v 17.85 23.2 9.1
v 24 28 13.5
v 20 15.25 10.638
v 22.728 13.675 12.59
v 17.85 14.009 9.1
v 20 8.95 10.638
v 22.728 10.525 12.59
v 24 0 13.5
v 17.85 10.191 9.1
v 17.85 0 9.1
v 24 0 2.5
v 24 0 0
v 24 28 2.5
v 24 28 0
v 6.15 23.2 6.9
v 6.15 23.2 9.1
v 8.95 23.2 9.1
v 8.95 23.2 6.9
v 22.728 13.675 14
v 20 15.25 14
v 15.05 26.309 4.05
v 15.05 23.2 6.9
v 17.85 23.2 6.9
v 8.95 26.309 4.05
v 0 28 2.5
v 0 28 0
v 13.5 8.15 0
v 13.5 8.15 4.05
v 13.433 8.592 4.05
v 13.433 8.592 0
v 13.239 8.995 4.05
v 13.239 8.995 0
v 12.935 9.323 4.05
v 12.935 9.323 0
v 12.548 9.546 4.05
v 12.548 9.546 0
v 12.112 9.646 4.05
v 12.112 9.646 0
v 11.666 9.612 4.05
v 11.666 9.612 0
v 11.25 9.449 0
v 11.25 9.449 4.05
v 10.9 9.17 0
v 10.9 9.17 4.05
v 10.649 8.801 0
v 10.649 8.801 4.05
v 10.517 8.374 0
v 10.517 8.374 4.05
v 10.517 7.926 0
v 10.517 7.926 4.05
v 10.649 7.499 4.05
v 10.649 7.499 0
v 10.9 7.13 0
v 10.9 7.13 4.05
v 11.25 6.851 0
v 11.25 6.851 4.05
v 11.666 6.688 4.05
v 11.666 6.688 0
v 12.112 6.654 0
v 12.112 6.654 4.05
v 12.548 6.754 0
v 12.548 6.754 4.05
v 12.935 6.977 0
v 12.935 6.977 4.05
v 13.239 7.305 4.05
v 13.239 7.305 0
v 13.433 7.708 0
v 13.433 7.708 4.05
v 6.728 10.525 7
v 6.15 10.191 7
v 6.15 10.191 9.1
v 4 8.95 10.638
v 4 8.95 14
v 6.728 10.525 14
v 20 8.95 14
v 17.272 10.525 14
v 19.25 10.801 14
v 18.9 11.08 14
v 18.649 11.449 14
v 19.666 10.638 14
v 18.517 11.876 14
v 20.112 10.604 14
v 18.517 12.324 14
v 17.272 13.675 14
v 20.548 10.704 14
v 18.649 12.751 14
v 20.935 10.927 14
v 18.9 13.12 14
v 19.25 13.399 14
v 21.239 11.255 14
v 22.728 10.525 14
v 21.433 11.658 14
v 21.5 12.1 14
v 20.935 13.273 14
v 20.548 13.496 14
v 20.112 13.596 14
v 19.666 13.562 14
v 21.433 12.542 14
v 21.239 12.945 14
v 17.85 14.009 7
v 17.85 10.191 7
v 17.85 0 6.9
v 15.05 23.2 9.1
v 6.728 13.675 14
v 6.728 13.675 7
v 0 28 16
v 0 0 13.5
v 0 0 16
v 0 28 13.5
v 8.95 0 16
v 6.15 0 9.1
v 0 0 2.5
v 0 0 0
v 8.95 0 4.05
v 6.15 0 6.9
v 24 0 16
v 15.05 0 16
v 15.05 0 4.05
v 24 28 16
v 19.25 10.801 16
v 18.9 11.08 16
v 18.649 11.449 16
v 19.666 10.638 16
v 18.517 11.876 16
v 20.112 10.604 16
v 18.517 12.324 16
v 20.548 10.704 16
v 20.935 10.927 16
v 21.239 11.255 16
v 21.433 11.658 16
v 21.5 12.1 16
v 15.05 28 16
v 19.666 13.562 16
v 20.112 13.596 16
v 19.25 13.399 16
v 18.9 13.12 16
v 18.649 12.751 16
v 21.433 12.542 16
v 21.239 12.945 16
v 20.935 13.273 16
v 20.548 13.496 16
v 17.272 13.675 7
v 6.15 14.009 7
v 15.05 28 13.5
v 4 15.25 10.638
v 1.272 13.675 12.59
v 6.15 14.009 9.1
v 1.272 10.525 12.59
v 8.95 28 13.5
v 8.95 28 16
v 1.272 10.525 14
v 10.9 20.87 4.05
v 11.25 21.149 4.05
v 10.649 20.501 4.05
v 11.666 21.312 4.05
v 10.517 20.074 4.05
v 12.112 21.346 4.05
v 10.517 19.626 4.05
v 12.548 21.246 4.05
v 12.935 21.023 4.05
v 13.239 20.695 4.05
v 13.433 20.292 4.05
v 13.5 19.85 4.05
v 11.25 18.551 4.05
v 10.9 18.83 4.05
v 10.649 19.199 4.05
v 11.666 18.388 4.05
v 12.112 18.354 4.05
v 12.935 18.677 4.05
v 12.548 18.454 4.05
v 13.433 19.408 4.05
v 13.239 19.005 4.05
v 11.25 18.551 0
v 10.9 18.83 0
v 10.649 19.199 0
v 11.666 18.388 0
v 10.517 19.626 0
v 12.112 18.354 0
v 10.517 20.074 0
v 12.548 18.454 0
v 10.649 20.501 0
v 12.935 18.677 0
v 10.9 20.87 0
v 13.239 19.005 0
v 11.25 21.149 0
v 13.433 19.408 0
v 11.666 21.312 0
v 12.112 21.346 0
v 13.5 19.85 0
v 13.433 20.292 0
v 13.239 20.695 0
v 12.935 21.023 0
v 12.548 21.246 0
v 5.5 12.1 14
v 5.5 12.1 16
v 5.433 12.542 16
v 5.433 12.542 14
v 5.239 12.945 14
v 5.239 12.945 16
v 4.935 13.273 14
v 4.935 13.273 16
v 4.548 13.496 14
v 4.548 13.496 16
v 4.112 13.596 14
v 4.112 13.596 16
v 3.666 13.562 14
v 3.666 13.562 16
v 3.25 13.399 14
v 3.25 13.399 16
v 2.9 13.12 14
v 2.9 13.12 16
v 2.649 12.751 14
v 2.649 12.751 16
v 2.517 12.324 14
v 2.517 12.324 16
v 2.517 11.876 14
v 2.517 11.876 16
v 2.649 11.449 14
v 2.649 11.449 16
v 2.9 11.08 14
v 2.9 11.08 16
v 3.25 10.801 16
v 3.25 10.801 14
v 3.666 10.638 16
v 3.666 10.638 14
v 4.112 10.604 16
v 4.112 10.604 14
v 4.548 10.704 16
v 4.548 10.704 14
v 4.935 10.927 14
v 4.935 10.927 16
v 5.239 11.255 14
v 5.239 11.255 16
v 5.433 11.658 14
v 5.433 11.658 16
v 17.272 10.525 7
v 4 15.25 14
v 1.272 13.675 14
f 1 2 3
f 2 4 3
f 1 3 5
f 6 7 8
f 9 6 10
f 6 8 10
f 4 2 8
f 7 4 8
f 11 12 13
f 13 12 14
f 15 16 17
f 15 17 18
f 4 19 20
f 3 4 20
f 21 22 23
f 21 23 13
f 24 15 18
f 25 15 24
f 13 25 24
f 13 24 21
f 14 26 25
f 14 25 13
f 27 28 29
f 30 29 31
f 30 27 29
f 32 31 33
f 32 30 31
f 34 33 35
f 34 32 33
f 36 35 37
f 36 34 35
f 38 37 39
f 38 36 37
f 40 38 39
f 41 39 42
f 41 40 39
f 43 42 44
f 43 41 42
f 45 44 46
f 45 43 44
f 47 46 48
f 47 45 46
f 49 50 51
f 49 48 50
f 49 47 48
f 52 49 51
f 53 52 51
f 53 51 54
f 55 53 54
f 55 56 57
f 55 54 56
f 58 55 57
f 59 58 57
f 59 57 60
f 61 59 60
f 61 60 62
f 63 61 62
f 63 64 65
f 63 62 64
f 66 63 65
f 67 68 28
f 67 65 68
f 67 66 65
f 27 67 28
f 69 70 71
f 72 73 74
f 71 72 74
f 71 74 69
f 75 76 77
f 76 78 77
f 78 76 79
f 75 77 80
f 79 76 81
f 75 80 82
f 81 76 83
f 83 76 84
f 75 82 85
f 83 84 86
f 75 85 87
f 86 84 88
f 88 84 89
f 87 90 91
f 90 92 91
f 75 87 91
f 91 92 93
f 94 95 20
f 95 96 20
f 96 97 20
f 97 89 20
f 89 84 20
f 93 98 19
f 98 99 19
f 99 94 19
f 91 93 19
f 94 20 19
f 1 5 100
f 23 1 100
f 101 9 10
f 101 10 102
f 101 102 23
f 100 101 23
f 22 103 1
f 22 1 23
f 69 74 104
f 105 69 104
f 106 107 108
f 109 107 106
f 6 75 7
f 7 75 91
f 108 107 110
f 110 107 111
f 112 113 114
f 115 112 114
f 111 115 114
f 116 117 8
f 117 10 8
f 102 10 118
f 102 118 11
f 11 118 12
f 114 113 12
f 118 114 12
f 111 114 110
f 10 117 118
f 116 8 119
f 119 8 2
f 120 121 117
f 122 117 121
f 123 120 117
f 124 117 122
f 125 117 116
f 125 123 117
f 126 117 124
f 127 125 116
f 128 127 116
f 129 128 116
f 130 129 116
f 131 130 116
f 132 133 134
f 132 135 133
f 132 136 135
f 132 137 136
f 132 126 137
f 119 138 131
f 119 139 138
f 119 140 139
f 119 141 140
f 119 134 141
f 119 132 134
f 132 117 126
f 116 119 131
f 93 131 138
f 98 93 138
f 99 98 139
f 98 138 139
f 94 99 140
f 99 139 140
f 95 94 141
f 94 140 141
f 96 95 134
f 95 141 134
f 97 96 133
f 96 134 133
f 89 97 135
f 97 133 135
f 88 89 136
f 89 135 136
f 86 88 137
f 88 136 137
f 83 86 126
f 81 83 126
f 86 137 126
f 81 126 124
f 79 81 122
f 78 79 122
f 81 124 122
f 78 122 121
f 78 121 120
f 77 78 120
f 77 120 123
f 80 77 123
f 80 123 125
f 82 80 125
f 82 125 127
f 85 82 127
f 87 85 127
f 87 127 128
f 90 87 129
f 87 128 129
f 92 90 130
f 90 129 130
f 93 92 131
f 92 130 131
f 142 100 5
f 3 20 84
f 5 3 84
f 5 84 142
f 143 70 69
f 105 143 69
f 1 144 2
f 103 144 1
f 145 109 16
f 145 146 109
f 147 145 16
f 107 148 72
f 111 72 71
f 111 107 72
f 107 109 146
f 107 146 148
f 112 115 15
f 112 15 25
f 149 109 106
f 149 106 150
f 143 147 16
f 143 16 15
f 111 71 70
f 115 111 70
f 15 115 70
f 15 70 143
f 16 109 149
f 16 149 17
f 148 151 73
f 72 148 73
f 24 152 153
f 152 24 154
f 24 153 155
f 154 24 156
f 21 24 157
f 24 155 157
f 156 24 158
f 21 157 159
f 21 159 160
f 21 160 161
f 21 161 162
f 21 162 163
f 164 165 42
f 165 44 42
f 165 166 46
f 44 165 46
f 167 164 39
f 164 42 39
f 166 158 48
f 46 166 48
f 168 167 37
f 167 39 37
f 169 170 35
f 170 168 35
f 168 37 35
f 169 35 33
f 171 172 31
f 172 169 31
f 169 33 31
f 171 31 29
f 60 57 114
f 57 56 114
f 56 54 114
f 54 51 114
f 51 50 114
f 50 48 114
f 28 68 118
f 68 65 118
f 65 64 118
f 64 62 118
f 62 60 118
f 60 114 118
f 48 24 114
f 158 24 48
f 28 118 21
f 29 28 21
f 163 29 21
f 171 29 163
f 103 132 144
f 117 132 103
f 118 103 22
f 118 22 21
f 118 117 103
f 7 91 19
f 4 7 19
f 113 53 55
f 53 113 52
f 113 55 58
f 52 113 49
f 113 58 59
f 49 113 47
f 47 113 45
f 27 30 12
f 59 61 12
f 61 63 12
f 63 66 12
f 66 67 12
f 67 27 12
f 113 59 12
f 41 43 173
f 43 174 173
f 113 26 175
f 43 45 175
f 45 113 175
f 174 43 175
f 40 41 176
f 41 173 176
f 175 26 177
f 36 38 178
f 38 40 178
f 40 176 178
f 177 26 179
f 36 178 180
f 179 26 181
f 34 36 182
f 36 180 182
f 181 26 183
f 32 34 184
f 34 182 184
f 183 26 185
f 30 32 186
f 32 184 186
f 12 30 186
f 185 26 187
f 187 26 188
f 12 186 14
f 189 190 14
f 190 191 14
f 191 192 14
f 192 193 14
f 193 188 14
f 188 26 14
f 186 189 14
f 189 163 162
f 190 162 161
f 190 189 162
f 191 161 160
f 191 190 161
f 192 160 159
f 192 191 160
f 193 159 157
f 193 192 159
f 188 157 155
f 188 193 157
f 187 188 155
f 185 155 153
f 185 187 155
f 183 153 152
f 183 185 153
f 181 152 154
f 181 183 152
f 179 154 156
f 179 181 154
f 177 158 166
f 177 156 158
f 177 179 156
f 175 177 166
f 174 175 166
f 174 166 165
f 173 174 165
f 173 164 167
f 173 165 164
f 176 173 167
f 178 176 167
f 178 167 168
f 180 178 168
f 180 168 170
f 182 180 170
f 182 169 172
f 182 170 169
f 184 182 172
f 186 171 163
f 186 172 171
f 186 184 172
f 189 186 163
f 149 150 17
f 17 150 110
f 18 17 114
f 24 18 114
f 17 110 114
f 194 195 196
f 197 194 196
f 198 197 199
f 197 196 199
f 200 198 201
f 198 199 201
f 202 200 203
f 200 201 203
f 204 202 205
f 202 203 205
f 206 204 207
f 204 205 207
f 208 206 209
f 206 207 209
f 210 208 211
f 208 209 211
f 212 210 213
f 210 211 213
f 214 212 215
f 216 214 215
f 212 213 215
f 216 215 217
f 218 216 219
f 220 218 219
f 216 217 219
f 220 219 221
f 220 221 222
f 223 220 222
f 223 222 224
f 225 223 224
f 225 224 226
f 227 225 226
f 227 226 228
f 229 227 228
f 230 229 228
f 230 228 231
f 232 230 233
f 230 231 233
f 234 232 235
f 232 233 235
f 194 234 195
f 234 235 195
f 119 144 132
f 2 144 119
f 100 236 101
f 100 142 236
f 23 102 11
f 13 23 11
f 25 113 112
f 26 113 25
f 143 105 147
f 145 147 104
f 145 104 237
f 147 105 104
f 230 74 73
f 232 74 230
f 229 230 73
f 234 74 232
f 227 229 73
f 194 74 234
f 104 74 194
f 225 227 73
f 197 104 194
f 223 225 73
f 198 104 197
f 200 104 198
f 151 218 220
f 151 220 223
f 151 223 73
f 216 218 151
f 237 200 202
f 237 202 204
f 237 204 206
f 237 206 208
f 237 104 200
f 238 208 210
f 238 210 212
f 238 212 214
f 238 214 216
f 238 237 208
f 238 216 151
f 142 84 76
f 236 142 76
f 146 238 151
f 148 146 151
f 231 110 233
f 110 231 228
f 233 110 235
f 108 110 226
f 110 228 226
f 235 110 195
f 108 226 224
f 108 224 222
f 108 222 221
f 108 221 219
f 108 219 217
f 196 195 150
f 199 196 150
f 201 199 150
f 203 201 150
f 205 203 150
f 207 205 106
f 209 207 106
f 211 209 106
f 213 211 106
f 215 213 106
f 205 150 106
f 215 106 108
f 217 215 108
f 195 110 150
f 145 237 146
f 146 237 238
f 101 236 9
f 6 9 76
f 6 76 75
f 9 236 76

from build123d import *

# Parameters (mm, degrees)
ESBO_O1_W                = 24
ESBO_O1_H                = 28
ESBO_O1_R                = 1.5
RESSALTO_EXTRUS_O1_DEPTH = 16
ESBO_O2_W                = 6.1
ESBO_O2_H                = 11.95
CORTE_EXTRUS_O1_DEPTH    = 41.199502484
CORTE_EXTRUS_O3_DEPTH    = 41.199502484
ESBO_O4_R                = 1.5
CORTE_EXTRUS_O4_DEPTH    = 7
CORTE_EXTRUS_O5_DEPTH    = 9
ESBO_O6_R                = 1.5
RESSALTO_EXTRUS_O2_DEPTH = 2


with BuildPart() as part:
    # Esboço1 → Ressalto-extrusão1 (new body)
    with BuildSketch(Plane.XY):
        with Locations((12, 14)):
            Rectangle(ESBO_O1_W, ESBO_O1_H)
        with Locations((12, 19.85)):
            Circle(ESBO_O1_R, mode=Mode.SUBTRACT)
        with Locations((12, 8.15)):
            Circle(ESBO_O1_R, mode=Mode.SUBTRACT)
    extrude(amount=RESSALTO_EXTRUS_O1_DEPTH)

    # Esboço2 → Corte-extrusão1 (cut, through all)
    with BuildSketch(Plane(origin=(0, 0, 0), x_dir=(1, 0, 0), z_dir=(0, 1, 0))):
        with Locations((12, -10.025)):
            Rectangle(ESBO_O2_W, ESBO_O2_H)
        Polygon((0, -13.5), (6.15, -9.1), (6.15, -6.9), (0, -2.5), align=None)
        Polygon((17.85, -6.9), (24, -2.5), (24, -13.5), (17.85, -9.1), align=None)
    extrude(amount=CORTE_EXTRUS_O1_DEPTH, mode=Mode.SUBTRACT)

    # Esboço3 → Corte-extrusão3 (cut, through all)
    with BuildSketch(Plane(origin=(0, 0, 0), x_dir=(0, 0, -1), z_dir=(1, 0, 0))):
        Polygon((-13.5, 28), (-9.1, 23.2), (-6.9, 23.2), (-2.5, 28), align=None)
    extrude(amount=CORTE_EXTRUS_O3_DEPTH, mode=Mode.SUBTRACT)

    # Esboço4 → Corte-extrusão4 (cut)
    with BuildSketch(Plane.XY.offset(16)):
        with Locations((4, 12.1)):
            Circle(ESBO_O4_R)
        with Locations((20, 12.1)):
            Circle(ESBO_O4_R)
    extrude(amount=-CORTE_EXTRUS_O4_DEPTH, mode=Mode.SUBTRACT)

    # Esboço5 → Corte-extrusão5 (cut)
    with BuildSketch(Plane.XY.offset(16)):
        Polygon((4, 8.95), (6.727980022, 10.525), (6.727980022, 13.675), (4, 15.25), (1.272019978, 13.675), (1.272019978, 10.525), align=None)
        Polygon((20, 8.95), (22.727980022, 10.525), (22.727980022, 13.675), (20, 15.25), (17.272019978, 13.675), (17.272019978, 10.525), align=None)
    extrude(amount=-CORTE_EXTRUS_O5_DEPTH, mode=Mode.SUBTRACT)

    # Esboço6 → Ressalto-extrusão2 (add)
    # profile 1 of 2: a face of its own
    with BuildSketch(Plane.XY.offset(16)):
        Polygon((6.727980022, 10.525), (4, 8.95), (1.272019978, 10.525), (1.272019978, 13.675), (4, 15.25), (6.727980022, 13.675), align=None)
        with Locations((4, 12.1)):
            Circle(ESBO_O6_R, mode=Mode.SUBTRACT)
    # profile 2 of 2: a face of its own
    with BuildSketch(Plane.XY.offset(16)):
        Polygon((17.272019978, 13.675), (17.272019978, 10.525), (20, 8.95), (22.727980022, 10.525), (22.727980022, 13.675), (20, 15.25), align=None)
        with Locations((20, 12.1)):
            Circle(ESBO_O6_R, mode=Mode.SUBTRACT)
    extrude(amount=-RESSALTO_EXTRUS_O2_DEPTH)


solid = part.part
